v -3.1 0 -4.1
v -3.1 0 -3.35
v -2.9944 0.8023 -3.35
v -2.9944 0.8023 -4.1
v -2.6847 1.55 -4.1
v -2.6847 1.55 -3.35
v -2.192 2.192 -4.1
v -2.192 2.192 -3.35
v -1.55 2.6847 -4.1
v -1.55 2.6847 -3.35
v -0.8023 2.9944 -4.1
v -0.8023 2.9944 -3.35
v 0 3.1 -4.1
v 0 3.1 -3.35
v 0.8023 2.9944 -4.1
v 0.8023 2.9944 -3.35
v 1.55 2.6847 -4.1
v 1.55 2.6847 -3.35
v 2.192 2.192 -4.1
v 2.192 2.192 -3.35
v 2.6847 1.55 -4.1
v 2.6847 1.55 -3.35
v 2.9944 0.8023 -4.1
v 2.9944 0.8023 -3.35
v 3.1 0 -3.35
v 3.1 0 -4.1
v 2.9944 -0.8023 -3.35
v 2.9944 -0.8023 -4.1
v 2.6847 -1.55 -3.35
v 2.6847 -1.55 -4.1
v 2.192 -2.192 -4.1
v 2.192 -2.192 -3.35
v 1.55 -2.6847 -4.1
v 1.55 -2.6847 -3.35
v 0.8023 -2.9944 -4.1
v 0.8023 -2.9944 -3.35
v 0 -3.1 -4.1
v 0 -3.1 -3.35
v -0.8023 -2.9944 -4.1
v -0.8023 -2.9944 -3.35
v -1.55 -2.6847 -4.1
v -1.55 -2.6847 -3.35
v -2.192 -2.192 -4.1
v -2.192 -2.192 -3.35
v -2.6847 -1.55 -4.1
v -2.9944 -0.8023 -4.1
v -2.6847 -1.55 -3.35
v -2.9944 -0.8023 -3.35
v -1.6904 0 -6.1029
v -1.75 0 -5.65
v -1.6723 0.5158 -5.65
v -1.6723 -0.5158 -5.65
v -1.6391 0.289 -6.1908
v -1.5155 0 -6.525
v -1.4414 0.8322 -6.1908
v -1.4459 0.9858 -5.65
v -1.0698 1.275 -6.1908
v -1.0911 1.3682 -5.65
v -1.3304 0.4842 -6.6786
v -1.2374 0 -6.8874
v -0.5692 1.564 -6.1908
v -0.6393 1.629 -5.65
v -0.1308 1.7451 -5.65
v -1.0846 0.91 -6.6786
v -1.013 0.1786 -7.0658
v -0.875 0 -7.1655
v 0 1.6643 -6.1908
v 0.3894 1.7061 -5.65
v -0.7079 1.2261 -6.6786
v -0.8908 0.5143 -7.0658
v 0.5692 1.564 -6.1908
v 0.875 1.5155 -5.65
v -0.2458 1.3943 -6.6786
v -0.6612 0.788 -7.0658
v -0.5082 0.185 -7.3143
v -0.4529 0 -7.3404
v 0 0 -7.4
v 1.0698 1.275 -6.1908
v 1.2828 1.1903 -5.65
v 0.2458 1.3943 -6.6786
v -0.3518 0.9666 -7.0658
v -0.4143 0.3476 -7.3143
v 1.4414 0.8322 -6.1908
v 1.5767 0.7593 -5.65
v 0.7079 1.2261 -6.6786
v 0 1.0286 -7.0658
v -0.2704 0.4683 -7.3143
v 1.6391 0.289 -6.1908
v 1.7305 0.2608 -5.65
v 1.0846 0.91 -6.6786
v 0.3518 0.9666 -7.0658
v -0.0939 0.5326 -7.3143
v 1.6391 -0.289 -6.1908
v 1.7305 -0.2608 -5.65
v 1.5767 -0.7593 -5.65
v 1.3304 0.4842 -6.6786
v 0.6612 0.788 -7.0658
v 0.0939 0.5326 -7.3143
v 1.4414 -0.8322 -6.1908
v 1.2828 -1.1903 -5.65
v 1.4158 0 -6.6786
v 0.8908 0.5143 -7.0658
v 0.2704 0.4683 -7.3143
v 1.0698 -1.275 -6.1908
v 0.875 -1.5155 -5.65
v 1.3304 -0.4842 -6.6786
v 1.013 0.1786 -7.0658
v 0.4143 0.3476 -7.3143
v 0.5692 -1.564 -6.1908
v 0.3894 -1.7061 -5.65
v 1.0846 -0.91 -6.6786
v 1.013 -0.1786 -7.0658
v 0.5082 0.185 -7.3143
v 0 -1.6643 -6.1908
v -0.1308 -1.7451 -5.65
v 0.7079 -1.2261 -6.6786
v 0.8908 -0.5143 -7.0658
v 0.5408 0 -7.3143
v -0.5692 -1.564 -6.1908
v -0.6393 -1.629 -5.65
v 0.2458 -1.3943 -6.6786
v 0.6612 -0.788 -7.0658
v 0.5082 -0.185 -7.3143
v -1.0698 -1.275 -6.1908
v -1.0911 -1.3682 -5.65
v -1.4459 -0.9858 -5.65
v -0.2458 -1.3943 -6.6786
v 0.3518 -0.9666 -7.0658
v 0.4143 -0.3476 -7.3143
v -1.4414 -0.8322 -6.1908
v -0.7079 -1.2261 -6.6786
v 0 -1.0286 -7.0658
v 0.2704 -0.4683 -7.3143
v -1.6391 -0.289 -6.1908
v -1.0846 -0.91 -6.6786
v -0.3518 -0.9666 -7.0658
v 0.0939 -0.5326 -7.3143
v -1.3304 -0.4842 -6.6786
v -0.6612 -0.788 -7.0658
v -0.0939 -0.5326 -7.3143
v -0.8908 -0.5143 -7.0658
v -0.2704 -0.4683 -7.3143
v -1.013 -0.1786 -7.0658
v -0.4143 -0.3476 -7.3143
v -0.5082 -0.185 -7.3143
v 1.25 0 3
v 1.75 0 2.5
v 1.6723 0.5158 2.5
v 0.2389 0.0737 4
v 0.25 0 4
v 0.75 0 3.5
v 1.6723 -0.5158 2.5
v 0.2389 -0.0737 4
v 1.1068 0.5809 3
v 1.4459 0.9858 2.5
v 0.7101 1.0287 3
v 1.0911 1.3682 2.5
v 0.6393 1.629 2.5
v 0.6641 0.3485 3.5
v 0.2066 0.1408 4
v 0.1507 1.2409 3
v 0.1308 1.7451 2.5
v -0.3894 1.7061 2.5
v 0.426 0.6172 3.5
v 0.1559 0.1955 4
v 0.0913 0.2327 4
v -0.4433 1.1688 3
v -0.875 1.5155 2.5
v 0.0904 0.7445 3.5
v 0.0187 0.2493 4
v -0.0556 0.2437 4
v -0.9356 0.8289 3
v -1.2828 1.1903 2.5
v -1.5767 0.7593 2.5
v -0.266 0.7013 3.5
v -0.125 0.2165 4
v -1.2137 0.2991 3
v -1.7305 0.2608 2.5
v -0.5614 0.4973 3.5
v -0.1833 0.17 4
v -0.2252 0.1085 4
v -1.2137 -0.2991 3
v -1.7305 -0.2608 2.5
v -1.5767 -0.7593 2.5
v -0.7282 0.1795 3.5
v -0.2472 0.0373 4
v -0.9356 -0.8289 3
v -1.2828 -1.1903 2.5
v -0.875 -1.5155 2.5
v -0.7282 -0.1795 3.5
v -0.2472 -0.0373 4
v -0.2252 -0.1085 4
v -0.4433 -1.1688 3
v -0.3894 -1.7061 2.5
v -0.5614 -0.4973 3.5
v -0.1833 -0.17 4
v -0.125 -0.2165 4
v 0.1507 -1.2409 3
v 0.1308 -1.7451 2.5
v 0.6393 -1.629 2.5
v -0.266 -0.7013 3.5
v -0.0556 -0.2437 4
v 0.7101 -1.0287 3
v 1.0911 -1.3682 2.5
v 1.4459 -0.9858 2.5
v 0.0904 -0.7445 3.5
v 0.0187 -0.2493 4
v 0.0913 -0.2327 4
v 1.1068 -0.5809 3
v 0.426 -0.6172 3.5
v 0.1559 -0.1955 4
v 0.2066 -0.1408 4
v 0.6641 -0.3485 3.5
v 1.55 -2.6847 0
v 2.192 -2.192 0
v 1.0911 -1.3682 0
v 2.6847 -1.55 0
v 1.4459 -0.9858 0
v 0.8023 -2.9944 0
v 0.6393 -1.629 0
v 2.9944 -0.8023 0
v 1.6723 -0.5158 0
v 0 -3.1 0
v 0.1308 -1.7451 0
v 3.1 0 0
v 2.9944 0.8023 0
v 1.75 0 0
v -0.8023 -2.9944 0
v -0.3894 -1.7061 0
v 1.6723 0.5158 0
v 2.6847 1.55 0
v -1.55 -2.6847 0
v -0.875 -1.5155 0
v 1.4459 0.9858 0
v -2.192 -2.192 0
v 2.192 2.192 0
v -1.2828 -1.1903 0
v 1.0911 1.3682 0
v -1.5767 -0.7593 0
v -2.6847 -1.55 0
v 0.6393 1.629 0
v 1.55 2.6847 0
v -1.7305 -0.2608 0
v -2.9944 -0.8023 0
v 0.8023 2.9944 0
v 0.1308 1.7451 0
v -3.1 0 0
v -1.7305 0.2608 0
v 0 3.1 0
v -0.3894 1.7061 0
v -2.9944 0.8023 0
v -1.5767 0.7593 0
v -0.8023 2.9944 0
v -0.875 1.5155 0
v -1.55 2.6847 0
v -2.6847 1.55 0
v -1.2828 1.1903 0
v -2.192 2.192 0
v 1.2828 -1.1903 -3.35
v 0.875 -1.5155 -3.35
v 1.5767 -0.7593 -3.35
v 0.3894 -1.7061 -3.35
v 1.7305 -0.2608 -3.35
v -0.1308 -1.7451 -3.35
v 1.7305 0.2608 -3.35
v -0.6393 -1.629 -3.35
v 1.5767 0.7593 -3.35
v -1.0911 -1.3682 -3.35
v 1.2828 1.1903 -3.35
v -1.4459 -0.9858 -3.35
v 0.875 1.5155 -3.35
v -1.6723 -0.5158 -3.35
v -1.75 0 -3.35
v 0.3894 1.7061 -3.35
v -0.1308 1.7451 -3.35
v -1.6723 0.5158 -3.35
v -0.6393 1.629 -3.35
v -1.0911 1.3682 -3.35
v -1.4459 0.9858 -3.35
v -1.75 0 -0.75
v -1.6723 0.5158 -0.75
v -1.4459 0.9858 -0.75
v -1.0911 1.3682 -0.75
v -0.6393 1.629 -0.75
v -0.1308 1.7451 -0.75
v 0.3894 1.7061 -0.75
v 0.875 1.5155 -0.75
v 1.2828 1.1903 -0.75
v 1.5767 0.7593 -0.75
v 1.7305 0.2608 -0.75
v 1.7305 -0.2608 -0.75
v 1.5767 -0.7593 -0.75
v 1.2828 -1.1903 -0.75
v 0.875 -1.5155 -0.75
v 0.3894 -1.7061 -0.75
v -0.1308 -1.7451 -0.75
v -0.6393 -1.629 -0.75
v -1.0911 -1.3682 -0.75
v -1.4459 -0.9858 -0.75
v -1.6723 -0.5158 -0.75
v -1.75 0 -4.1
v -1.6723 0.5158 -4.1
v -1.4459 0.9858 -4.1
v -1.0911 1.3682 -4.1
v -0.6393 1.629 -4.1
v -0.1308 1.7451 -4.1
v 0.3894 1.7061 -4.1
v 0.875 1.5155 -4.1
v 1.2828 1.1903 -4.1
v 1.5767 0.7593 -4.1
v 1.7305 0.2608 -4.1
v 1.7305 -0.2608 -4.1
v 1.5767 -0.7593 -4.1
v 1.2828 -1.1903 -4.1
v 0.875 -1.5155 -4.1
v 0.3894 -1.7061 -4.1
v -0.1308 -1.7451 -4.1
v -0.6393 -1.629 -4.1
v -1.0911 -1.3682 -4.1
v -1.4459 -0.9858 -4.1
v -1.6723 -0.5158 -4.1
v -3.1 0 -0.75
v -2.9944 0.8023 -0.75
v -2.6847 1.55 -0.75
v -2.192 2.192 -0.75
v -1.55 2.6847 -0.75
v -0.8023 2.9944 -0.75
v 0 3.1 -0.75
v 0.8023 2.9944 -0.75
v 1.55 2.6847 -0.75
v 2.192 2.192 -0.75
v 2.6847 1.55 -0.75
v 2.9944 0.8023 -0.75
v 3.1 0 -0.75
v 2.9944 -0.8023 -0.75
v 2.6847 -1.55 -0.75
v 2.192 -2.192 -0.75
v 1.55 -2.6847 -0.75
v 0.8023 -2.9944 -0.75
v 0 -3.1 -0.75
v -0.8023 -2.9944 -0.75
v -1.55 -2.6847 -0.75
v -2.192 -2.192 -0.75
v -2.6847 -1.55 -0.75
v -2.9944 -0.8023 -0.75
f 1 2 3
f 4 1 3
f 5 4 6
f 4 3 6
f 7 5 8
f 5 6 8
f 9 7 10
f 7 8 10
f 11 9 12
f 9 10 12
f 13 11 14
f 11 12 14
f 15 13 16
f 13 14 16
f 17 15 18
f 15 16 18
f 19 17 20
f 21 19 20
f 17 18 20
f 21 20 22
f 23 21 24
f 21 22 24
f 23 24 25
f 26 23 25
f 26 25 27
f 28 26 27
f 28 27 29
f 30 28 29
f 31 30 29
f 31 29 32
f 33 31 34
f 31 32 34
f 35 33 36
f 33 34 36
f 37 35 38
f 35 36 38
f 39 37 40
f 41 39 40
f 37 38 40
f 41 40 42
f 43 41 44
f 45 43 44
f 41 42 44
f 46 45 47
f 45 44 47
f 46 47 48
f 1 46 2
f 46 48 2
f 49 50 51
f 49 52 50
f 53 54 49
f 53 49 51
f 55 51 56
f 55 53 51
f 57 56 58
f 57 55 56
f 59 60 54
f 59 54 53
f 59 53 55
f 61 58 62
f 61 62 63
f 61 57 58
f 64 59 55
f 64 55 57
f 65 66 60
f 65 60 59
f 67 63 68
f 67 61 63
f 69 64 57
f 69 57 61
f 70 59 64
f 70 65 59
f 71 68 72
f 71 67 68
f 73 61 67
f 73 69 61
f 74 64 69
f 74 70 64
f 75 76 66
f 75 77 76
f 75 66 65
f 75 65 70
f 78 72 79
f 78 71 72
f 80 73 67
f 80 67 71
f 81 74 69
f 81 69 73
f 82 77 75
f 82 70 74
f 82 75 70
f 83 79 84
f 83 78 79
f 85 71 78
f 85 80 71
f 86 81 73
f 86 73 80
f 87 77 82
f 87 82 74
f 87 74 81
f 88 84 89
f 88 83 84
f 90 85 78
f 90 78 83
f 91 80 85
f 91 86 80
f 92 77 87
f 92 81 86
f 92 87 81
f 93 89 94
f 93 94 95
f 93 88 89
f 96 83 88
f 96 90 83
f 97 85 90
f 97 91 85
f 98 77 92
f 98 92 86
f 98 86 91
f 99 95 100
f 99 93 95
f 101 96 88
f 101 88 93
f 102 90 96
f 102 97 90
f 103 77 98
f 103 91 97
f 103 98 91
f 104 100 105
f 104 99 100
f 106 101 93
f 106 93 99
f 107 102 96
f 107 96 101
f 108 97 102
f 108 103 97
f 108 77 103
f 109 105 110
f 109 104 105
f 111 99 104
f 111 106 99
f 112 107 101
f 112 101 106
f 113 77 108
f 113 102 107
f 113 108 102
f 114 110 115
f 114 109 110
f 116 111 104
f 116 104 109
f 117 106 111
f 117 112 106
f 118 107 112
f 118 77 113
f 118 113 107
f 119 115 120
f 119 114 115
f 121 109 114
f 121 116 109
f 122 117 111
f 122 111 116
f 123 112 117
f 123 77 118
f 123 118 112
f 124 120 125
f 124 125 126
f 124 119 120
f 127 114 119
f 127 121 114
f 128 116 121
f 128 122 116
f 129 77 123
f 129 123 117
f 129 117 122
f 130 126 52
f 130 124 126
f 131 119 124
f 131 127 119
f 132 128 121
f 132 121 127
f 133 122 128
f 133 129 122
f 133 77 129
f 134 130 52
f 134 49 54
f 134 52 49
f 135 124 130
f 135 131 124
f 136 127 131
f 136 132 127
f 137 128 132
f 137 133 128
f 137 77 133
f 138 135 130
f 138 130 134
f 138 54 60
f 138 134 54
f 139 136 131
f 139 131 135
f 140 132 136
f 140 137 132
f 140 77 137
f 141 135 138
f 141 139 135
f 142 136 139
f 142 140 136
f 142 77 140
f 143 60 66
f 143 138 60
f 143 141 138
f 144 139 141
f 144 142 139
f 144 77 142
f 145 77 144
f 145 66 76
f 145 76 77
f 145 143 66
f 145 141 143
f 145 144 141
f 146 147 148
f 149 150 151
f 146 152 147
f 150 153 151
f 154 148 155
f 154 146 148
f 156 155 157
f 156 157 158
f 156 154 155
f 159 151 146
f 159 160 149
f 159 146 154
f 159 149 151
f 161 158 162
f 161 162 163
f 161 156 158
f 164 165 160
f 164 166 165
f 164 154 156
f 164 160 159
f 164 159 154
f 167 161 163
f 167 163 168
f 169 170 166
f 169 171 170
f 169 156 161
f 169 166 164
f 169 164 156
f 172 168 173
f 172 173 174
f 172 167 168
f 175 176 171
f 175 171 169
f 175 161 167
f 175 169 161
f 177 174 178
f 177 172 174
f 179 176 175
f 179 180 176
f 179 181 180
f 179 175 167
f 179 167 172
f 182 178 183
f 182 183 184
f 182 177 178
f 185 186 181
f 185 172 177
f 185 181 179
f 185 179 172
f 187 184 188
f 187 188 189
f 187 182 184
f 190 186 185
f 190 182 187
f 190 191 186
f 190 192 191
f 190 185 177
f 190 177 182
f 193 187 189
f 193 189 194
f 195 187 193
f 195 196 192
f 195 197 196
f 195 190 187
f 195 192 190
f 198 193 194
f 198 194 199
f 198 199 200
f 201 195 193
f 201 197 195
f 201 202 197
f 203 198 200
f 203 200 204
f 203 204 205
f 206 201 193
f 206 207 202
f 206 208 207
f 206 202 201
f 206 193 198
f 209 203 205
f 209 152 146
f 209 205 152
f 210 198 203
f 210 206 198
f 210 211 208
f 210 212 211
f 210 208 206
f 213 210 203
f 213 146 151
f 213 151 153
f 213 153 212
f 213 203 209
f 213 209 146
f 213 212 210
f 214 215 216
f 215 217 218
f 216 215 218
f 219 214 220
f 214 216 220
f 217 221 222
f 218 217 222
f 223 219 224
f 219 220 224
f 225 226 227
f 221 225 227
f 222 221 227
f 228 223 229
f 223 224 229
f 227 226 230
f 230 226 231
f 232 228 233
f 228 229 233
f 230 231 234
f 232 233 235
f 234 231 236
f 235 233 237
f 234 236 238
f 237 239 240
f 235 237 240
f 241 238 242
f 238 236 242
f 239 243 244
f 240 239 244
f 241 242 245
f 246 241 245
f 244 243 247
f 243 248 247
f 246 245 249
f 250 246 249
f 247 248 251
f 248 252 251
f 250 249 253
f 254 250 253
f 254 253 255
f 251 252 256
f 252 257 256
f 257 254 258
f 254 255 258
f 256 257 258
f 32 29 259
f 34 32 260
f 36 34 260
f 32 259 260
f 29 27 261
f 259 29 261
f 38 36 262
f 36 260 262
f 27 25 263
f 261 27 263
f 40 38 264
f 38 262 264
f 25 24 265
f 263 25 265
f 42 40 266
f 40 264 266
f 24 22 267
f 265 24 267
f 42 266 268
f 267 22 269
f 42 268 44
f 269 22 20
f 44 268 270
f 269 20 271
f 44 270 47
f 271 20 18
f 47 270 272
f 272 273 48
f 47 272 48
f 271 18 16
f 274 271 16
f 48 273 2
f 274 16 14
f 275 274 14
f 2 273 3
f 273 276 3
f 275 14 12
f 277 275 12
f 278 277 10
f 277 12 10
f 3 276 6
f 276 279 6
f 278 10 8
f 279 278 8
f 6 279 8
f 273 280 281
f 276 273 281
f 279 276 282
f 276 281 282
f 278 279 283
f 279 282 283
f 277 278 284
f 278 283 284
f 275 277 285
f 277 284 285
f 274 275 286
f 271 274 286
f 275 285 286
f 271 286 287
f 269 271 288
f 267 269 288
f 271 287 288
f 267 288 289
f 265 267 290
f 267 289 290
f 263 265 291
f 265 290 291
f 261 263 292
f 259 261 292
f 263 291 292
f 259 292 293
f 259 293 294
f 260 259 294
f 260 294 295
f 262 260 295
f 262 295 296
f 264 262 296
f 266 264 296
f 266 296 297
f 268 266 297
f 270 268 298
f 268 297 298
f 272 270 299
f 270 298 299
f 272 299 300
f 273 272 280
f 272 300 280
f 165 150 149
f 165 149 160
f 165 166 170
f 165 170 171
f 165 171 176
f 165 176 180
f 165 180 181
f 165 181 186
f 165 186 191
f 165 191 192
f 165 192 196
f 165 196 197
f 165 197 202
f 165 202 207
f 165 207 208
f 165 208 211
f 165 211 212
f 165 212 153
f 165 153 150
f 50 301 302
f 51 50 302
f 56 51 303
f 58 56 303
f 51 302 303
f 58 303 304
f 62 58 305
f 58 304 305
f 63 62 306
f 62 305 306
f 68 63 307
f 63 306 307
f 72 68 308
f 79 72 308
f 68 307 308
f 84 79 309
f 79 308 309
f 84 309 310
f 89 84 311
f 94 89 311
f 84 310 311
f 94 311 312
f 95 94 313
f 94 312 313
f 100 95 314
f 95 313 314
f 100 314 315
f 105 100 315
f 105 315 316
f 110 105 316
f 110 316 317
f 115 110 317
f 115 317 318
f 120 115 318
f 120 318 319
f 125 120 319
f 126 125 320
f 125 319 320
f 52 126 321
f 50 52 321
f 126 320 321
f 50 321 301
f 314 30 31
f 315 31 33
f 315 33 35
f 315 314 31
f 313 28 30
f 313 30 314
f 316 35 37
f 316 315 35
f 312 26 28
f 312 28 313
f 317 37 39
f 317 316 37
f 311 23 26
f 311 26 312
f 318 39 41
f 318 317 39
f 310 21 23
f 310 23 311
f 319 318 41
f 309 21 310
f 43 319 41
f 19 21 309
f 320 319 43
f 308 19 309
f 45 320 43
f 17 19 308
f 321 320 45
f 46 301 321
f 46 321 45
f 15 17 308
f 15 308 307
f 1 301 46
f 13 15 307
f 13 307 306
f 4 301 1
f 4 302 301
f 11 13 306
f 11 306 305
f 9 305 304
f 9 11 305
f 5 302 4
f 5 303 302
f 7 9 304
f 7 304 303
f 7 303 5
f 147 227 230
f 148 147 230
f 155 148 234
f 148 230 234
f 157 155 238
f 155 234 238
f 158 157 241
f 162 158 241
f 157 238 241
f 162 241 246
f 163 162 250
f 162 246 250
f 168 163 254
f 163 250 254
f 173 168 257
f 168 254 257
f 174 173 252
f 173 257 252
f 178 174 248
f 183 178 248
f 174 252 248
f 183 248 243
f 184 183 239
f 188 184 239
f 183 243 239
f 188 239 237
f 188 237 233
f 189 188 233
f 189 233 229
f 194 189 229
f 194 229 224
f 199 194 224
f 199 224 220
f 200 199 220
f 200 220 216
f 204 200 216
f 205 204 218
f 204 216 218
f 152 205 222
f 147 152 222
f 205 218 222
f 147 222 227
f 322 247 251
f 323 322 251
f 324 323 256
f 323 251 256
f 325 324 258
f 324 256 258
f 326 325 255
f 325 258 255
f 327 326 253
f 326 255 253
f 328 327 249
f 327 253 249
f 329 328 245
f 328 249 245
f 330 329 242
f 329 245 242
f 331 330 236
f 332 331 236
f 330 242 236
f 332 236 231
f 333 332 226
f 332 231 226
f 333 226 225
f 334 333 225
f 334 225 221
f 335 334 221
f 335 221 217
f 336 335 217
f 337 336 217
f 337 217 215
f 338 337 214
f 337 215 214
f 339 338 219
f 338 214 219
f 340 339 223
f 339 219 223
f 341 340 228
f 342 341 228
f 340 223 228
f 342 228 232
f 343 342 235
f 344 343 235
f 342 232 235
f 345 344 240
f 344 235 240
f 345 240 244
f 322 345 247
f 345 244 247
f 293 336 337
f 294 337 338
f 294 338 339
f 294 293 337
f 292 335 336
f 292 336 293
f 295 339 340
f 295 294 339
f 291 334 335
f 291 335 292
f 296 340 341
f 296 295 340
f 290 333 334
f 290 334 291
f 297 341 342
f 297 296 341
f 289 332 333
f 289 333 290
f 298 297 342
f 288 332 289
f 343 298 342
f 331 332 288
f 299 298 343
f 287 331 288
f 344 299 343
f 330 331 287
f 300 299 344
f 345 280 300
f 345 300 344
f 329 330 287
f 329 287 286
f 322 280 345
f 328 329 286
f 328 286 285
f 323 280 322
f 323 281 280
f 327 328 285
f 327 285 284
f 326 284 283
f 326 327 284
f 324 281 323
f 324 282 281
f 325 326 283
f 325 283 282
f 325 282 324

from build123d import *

# Parameters (mm, degrees)
ESQUISSE1_R        = 1.75
BOSS_EXTRU_1_DEPTH = 4
ESQUISSE3_R        = 3.1
BOSS_EXTRU_2_DEPTH = 0.75
ESQUISSE4_R        = 1.75
BOSS_EXTRU_3_DEPTH = 2.6
ESQUISSE5_R        = 3.1
BOSS_EXTRU_4_DEPTH = 0.75
ESQUISSE6_R        = 1.75
BOSS_EXTRU_5_DEPTH = 3.3
CHANFREIN1_SIZE    = 1.5
CONG_1_R           = 1.75


with BuildPart() as part:
    # Esquisse1 → Boss.-Extru.1 (new body)
    with BuildSketch(Plane.XY):
        Circle(ESQUISSE1_R)
    extrude(amount=BOSS_EXTRU_1_DEPTH)

    # Esquisse3 → Boss.-Extru.2 (add)
    with BuildSketch(Plane(origin=(0, 0, 0), x_dir=(-1, 0, 0), z_dir=(0, 0, -1))):
        Circle(ESQUISSE3_R)
    extrude(amount=BOSS_EXTRU_2_DEPTH)

    # Esquisse4 → Boss.-Extru.3 (add)
    with BuildSketch(Plane(origin=(0, 0, -0.75), x_dir=(-1, 0, 0), z_dir=(0, 0, -1))):
        Circle(ESQUISSE4_R)
    extrude(amount=BOSS_EXTRU_3_DEPTH)

    # Esquisse5 → Boss.-Extru.4 (add)
    with BuildSketch(Plane(origin=(0, 0, -3.35), x_dir=(-1, 0, 0), z_dir=(0, 0, -1))):
        Circle(ESQUISSE5_R)
    extrude(amount=BOSS_EXTRU_4_DEPTH)

    # Esquisse6 → Boss.-Extru.5 (add)
    with BuildSketch(Plane(origin=(0, 0, -4.1), x_dir=(-1, 0, 0), z_dir=(0, 0, -1))):
        Circle(ESQUISSE6_R)
    extrude(amount=BOSS_EXTRU_5_DEPTH)

    # Chanfrein1
    chanfrein1_edges = [part.edges().sort_by_distance(p)[0] for p in [
        (-1.75, 0, 4),
    ]]
    chamfer(chanfrein1_edges, length=CHANFREIN1_SIZE)

    # Congé1
    cong_1_edges = [part.edges().sort_by_distance(p)[0] for p in [
        (1.75, 0, -7.4),
    ]]
    fillet(cong_1_edges, radius=CONG_1_R)


solid = part.part
